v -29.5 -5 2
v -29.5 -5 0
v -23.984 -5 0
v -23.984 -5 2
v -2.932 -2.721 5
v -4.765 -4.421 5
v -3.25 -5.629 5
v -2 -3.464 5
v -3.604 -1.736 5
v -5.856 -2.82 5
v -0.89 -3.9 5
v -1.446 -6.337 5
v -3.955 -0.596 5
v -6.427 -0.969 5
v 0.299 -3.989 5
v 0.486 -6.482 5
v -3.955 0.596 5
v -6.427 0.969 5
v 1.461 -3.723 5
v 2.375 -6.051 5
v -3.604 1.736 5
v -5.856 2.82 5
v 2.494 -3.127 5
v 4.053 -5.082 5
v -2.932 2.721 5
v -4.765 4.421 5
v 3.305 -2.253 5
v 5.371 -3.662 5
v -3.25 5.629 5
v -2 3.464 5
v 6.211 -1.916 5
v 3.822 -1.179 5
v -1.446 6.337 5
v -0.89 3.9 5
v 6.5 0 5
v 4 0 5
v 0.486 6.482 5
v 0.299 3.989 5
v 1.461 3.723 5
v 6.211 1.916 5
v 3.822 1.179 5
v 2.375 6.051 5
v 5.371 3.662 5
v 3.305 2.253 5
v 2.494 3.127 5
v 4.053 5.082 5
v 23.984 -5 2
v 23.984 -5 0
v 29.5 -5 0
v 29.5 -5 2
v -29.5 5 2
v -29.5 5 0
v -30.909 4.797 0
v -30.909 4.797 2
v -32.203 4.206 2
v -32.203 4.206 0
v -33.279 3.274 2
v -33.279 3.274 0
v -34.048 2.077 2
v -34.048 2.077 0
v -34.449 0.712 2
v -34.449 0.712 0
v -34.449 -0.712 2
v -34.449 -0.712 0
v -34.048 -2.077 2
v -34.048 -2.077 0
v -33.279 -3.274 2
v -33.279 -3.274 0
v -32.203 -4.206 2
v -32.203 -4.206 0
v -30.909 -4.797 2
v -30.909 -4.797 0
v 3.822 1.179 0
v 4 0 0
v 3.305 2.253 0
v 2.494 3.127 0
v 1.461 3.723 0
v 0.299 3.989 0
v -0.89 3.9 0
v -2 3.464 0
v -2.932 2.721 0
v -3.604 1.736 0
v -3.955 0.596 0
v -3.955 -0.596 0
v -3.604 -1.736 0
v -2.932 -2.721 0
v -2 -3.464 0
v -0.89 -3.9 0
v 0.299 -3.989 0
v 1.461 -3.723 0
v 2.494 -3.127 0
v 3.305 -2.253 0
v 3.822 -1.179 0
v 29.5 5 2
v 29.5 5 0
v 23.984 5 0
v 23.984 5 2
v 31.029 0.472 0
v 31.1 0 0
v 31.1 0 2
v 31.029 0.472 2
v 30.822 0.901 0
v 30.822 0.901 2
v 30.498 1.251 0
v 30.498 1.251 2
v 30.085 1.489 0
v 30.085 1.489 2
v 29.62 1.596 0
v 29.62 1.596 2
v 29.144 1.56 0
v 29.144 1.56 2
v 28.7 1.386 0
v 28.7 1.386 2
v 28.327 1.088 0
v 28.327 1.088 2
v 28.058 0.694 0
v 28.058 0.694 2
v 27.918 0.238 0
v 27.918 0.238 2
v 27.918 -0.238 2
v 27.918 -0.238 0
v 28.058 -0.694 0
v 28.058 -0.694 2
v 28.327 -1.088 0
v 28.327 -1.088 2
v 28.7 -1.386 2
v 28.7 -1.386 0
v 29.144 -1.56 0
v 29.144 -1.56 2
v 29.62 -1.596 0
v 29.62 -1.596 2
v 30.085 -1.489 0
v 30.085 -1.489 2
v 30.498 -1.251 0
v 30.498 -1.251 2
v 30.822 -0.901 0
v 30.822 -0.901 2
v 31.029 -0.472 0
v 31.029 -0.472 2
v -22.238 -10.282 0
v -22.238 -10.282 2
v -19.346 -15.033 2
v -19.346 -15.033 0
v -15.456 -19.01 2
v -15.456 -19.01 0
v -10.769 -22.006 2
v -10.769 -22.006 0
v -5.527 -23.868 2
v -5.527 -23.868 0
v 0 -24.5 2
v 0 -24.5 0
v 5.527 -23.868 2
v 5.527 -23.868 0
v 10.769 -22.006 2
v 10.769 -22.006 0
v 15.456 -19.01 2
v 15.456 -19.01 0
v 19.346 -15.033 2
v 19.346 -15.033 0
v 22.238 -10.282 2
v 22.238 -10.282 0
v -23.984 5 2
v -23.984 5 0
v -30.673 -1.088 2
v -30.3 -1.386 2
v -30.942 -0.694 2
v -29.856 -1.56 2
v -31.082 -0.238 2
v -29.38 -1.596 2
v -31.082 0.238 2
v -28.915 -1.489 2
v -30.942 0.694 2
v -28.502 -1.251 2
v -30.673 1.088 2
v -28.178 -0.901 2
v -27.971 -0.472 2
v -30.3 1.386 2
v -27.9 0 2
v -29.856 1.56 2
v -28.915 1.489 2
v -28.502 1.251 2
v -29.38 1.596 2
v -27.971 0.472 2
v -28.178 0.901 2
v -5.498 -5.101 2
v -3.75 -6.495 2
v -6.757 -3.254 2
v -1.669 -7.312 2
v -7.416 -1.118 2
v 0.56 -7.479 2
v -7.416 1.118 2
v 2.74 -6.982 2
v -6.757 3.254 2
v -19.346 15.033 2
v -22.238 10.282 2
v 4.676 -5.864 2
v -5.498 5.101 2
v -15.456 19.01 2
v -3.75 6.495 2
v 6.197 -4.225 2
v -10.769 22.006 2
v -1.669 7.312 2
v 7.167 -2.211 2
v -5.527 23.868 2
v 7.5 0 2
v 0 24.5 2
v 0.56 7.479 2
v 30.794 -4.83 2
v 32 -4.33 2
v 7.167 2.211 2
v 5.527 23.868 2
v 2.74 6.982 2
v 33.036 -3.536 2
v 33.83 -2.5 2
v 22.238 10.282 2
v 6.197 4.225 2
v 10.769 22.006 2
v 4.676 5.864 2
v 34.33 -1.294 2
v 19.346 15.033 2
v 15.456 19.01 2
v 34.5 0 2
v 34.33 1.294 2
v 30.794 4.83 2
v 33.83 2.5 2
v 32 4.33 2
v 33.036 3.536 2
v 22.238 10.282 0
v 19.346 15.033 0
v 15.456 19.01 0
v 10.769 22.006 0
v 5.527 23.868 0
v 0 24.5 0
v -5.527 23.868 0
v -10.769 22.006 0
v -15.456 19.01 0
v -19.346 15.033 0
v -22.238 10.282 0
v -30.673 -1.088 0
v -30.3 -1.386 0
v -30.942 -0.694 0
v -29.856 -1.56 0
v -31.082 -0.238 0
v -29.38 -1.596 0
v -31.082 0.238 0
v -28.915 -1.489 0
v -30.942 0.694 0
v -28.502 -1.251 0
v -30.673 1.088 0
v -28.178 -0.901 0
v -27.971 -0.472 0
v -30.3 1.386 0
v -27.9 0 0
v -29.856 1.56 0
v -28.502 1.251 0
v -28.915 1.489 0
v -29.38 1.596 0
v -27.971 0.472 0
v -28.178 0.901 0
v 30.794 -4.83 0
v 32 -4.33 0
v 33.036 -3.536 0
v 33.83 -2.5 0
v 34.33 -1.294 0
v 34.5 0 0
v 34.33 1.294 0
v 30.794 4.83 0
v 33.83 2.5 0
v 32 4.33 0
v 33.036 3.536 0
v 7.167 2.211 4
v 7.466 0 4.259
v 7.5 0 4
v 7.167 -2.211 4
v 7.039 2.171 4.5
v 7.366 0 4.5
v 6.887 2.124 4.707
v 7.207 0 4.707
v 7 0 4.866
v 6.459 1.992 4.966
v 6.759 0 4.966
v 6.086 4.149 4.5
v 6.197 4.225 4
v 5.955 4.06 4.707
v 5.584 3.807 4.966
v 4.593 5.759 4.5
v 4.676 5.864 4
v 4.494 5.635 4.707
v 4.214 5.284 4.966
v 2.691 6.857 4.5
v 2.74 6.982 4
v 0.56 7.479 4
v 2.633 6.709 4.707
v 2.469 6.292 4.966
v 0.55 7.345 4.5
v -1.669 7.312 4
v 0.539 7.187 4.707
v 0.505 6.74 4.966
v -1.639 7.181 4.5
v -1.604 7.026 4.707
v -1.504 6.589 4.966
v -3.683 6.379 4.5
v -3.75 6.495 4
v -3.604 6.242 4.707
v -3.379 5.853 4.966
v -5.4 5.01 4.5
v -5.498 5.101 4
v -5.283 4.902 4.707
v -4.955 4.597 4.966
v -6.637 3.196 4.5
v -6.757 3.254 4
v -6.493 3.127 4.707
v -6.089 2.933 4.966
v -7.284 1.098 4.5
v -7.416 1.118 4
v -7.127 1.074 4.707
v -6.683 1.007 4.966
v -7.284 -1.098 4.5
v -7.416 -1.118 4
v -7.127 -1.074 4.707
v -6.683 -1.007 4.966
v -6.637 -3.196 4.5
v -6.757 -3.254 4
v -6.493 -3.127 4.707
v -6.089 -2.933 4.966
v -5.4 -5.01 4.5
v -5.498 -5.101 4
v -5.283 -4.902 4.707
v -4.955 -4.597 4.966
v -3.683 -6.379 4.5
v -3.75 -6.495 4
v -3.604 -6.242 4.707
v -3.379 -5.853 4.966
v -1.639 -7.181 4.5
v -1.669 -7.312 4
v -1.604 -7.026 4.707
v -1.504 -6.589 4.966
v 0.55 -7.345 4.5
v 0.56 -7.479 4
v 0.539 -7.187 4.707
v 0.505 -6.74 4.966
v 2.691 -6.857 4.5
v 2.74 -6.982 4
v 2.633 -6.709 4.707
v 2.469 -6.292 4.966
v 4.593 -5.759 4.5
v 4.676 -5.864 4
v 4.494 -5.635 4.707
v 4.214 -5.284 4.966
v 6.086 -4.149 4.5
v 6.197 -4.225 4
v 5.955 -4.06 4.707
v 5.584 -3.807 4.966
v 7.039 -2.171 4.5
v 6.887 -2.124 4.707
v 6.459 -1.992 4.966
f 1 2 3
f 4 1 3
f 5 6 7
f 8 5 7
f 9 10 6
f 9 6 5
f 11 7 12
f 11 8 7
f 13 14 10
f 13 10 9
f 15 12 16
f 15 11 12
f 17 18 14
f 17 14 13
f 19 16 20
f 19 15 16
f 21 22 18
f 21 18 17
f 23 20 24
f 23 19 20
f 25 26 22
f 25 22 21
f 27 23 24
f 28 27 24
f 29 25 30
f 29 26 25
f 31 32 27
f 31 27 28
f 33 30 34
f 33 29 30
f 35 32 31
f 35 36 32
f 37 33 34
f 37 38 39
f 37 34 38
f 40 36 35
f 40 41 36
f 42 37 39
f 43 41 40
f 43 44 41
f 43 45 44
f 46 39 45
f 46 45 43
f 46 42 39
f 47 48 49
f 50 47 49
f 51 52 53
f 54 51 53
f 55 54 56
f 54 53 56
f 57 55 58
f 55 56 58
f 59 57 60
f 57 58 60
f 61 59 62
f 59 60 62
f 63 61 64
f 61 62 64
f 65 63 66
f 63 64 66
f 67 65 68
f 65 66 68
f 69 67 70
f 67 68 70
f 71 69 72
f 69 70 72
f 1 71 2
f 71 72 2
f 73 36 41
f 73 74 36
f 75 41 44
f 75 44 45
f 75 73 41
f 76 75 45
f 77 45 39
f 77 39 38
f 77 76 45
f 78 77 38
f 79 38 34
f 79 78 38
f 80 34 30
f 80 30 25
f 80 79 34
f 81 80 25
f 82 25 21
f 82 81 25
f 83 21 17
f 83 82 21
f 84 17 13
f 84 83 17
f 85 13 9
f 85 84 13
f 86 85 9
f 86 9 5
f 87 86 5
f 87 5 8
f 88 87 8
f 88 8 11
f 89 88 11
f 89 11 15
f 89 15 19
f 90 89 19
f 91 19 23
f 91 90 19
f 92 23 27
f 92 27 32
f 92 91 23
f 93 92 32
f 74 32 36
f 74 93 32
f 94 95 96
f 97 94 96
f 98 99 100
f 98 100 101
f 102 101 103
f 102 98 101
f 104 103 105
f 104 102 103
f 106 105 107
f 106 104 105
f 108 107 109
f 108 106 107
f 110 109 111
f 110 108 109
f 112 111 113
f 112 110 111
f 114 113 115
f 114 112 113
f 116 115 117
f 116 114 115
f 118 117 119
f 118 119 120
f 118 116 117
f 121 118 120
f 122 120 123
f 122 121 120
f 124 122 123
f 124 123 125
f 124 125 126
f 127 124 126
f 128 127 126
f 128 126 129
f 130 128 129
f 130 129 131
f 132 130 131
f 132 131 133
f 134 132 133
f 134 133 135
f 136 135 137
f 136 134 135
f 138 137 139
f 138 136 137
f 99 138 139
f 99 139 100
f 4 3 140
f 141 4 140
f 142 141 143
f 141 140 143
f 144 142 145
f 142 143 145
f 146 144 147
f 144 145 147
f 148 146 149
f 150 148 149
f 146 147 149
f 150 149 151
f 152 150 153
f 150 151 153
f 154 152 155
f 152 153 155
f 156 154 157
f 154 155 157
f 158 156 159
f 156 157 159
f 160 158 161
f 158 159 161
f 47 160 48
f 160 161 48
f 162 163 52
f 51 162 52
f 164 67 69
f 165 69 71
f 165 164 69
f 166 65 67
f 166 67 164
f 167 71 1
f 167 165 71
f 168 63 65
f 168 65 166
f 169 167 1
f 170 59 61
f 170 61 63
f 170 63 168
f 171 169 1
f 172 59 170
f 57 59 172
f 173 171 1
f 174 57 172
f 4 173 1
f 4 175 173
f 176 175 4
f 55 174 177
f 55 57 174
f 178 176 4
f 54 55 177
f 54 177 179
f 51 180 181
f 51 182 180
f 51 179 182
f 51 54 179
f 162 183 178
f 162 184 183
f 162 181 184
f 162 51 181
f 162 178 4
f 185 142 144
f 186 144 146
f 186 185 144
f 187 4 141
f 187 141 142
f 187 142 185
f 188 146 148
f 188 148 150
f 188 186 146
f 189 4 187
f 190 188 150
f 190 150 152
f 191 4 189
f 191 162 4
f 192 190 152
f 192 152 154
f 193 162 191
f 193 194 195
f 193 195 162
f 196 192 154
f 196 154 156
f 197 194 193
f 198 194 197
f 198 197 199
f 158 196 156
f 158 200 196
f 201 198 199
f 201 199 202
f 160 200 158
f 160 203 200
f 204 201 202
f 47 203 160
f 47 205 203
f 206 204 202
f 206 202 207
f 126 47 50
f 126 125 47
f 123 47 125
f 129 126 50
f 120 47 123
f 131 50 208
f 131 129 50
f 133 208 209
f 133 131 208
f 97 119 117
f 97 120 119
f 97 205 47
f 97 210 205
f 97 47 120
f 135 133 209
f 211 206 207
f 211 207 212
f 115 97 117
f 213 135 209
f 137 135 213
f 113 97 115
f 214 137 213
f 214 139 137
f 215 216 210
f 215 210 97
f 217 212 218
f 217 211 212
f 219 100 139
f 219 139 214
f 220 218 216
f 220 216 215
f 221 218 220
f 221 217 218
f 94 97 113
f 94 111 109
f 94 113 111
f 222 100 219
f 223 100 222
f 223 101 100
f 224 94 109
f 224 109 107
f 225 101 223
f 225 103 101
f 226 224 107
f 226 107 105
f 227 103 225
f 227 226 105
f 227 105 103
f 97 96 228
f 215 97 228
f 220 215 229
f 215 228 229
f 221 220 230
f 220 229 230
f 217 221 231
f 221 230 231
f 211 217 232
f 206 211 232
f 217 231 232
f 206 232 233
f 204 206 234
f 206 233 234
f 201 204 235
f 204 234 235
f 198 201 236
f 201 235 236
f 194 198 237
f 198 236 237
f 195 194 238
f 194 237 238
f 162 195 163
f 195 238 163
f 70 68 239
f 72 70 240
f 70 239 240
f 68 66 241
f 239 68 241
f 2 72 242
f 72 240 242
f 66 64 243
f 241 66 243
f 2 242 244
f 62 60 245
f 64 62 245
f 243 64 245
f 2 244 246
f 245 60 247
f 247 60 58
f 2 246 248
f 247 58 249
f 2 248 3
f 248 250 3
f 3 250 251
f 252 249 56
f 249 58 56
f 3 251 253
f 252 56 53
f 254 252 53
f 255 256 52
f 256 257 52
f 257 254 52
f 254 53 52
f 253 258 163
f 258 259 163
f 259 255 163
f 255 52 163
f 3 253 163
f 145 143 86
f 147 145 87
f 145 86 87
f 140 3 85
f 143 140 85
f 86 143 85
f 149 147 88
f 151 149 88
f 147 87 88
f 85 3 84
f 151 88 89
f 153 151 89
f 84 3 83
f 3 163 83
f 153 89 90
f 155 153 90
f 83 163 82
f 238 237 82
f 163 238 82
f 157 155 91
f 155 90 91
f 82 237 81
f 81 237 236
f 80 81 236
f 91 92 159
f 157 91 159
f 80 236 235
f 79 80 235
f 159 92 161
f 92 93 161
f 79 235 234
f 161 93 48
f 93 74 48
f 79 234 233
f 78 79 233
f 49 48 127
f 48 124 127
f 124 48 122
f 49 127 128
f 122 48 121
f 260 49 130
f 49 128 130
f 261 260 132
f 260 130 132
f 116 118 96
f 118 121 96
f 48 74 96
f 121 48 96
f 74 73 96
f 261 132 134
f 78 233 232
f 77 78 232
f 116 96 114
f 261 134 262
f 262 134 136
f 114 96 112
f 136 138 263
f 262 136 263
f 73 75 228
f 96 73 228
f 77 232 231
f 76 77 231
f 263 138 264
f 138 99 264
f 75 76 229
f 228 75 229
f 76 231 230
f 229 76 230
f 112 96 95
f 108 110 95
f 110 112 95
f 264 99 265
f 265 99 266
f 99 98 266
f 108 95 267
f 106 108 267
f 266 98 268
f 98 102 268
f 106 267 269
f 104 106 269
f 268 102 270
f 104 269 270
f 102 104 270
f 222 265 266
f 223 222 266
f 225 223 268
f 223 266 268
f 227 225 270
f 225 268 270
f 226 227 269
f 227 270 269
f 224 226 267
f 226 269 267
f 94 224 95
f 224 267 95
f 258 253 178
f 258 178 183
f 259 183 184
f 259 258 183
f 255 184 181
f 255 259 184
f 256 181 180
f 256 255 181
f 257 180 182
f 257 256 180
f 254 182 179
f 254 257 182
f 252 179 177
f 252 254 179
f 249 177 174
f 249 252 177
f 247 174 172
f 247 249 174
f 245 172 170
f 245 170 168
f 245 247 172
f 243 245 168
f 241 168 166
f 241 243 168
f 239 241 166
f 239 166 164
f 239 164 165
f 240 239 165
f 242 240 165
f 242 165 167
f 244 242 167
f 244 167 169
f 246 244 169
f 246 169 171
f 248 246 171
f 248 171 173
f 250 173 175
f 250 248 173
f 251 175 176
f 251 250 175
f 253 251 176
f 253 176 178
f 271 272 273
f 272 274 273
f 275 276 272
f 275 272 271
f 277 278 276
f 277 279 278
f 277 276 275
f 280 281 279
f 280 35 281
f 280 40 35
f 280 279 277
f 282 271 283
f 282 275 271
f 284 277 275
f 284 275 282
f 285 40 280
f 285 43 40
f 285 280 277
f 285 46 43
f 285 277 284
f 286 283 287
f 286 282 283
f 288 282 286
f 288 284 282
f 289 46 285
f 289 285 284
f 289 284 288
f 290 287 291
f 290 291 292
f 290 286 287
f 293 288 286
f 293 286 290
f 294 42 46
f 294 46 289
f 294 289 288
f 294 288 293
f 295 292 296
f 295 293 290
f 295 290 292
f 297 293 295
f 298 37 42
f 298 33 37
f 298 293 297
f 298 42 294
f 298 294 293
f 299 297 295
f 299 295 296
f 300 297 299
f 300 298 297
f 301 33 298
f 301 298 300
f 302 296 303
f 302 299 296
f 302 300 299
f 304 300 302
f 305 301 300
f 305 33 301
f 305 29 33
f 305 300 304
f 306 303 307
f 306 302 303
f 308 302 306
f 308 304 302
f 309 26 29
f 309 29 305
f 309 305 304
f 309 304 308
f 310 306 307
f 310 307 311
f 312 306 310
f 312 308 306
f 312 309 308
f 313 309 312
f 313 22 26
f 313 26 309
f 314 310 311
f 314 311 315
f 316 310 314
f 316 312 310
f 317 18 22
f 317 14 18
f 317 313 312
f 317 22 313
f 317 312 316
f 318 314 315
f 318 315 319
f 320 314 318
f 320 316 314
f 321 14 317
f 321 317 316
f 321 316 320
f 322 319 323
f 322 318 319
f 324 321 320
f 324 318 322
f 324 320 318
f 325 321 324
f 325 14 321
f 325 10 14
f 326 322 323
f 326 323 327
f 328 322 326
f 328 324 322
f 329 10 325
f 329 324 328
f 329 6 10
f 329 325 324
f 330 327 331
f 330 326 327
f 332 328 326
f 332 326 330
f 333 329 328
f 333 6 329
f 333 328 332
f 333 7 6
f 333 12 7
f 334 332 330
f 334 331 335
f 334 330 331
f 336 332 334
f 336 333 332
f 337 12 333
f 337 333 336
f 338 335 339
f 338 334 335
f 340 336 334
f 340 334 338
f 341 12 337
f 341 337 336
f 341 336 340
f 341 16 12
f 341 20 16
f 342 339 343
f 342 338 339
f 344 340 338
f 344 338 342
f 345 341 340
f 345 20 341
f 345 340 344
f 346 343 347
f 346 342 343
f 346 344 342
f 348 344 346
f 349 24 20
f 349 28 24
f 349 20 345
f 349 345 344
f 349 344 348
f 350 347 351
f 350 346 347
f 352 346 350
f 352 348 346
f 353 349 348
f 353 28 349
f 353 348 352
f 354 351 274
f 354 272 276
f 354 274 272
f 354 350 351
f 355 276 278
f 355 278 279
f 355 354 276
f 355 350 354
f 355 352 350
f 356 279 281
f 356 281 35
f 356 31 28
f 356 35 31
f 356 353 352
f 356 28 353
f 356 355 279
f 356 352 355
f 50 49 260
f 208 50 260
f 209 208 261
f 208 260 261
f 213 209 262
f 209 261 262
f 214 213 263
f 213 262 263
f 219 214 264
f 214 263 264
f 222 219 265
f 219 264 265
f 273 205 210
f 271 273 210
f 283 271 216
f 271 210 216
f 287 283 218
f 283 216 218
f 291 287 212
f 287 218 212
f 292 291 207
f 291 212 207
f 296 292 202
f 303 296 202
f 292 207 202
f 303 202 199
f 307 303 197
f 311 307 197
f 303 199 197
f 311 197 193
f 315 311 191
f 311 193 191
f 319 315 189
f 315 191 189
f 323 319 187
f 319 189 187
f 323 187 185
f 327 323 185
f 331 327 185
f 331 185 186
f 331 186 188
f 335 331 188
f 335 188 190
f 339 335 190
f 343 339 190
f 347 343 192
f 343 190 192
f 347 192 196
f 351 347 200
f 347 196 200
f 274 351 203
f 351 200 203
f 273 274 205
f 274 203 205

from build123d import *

# Parameters (mm, degrees)
F0_R     = 1.6
F0_R_2   = 4
F1_DEPTH = 2
F2_R     = 7.5
F2_R_2   = 4
F3_DEPTH = 3
F4_R     = 1


with BuildPart() as f1:
    # F0 (on Top) → F1 (new body)
    with BuildSketch(Plane.XY):
        with BuildLine():
            ThreePointArc((-29.5, -5), (-25.964466, -3.535534), (-24.5, 0))
            ThreePointArc((-24.5, 0), (-25.964466, 3.535534), (-29.5, 5))
            ThreePointArc((-29.5, 5), (-34.5, 0), (-29.5, -5))
        make_face()
        with Locations((-29.5, 0)):
            Circle(F0_R, mode=Mode.SUBTRACT)
        with BuildLine():
            ThreePointArc((-29.5, 5), (-25.964466, 3.535534), (-24.5, 0))
            ThreePointArc((-24.5, 0), (-24.370752, 2.513259), (-23.98437, 5))
            Line((-23.98437, 5), (-29.5, 5))
        make_face()
        with BuildLine():
            ThreePointArc((-23.98437, -5), (-24.370752, -2.513259), (-24.5, 0))
            ThreePointArc((-24.5, 0), (-25.964466, -3.535534), (-29.5, -5))
            Line((-29.5, -5), (-23.98437, -5))
        make_face()
        with BuildLine():
            ThreePointArc((-23.98437, 5), (-24.370752, 2.513259), (-24.5, 0))
            ThreePointArc((-24.5, 0), (-24.370752, -2.513259), (-23.98437, -5))
            ThreePointArc((-23.98437, -5), (0, -24.5), (23.98437, -5))
            ThreePointArc((23.98437, -5), (24.370752, -2.513259), (24.5, 0))
            ThreePointArc((24.5, 0), (24.370752, 2.513259), (23.98437, 5))
            ThreePointArc((23.98437, 5), (0, 24.5), (-23.98437, 5))
        make_face()
        Circle(F0_R_2, mode=Mode.SUBTRACT)
        with BuildLine():
            ThreePointArc((29.5, 5), (25.964466, 3.535534), (24.5, 0))
            ThreePointArc((24.5, 0), (25.964466, -3.535534), (29.5, -5))
            ThreePointArc((29.5, -5), (33.035534, -3.535534), (34.5, 0))
            ThreePointArc((34.5, 0), (33.035534, 3.535534), (29.5, 5))
        make_face()
        with Locations((29.5, 0)):
            Circle(F0_R, mode=Mode.SUBTRACT)
        with BuildLine():
            ThreePointArc((24.5, 0), (24.370752, -2.513259), (23.98437, -5))
            Line((23.98437, -5), (29.5, -5))
            ThreePointArc((29.5, -5), (25.964466, -3.535534), (24.5, 0))
        make_face()
        with BuildLine():
            Line((29.5, 5), (23.98437, 5))
            ThreePointArc((23.98437, 5), (24.370752, 2.513259), (24.5, 0))
            ThreePointArc((24.5, 0), (25.964466, 3.535534), (29.5, 5))
        make_face()
    extrude(amount=F1_DEPTH)

    # F2 (on face) → F3 (join)
    with BuildSketch(Plane.XY.offset(2)):
        Circle(F2_R)
        Circle(F2_R_2, mode=Mode.SUBTRACT)
    extrude(amount=F3_DEPTH)

    # F4
    f4_edges = [f1.edges().sort_by_distance(p)[0] for p in [
        (-7.5, 0, 5),
    ]]
    fillet(f4_edges, radius=F4_R)


solid = f1.part
